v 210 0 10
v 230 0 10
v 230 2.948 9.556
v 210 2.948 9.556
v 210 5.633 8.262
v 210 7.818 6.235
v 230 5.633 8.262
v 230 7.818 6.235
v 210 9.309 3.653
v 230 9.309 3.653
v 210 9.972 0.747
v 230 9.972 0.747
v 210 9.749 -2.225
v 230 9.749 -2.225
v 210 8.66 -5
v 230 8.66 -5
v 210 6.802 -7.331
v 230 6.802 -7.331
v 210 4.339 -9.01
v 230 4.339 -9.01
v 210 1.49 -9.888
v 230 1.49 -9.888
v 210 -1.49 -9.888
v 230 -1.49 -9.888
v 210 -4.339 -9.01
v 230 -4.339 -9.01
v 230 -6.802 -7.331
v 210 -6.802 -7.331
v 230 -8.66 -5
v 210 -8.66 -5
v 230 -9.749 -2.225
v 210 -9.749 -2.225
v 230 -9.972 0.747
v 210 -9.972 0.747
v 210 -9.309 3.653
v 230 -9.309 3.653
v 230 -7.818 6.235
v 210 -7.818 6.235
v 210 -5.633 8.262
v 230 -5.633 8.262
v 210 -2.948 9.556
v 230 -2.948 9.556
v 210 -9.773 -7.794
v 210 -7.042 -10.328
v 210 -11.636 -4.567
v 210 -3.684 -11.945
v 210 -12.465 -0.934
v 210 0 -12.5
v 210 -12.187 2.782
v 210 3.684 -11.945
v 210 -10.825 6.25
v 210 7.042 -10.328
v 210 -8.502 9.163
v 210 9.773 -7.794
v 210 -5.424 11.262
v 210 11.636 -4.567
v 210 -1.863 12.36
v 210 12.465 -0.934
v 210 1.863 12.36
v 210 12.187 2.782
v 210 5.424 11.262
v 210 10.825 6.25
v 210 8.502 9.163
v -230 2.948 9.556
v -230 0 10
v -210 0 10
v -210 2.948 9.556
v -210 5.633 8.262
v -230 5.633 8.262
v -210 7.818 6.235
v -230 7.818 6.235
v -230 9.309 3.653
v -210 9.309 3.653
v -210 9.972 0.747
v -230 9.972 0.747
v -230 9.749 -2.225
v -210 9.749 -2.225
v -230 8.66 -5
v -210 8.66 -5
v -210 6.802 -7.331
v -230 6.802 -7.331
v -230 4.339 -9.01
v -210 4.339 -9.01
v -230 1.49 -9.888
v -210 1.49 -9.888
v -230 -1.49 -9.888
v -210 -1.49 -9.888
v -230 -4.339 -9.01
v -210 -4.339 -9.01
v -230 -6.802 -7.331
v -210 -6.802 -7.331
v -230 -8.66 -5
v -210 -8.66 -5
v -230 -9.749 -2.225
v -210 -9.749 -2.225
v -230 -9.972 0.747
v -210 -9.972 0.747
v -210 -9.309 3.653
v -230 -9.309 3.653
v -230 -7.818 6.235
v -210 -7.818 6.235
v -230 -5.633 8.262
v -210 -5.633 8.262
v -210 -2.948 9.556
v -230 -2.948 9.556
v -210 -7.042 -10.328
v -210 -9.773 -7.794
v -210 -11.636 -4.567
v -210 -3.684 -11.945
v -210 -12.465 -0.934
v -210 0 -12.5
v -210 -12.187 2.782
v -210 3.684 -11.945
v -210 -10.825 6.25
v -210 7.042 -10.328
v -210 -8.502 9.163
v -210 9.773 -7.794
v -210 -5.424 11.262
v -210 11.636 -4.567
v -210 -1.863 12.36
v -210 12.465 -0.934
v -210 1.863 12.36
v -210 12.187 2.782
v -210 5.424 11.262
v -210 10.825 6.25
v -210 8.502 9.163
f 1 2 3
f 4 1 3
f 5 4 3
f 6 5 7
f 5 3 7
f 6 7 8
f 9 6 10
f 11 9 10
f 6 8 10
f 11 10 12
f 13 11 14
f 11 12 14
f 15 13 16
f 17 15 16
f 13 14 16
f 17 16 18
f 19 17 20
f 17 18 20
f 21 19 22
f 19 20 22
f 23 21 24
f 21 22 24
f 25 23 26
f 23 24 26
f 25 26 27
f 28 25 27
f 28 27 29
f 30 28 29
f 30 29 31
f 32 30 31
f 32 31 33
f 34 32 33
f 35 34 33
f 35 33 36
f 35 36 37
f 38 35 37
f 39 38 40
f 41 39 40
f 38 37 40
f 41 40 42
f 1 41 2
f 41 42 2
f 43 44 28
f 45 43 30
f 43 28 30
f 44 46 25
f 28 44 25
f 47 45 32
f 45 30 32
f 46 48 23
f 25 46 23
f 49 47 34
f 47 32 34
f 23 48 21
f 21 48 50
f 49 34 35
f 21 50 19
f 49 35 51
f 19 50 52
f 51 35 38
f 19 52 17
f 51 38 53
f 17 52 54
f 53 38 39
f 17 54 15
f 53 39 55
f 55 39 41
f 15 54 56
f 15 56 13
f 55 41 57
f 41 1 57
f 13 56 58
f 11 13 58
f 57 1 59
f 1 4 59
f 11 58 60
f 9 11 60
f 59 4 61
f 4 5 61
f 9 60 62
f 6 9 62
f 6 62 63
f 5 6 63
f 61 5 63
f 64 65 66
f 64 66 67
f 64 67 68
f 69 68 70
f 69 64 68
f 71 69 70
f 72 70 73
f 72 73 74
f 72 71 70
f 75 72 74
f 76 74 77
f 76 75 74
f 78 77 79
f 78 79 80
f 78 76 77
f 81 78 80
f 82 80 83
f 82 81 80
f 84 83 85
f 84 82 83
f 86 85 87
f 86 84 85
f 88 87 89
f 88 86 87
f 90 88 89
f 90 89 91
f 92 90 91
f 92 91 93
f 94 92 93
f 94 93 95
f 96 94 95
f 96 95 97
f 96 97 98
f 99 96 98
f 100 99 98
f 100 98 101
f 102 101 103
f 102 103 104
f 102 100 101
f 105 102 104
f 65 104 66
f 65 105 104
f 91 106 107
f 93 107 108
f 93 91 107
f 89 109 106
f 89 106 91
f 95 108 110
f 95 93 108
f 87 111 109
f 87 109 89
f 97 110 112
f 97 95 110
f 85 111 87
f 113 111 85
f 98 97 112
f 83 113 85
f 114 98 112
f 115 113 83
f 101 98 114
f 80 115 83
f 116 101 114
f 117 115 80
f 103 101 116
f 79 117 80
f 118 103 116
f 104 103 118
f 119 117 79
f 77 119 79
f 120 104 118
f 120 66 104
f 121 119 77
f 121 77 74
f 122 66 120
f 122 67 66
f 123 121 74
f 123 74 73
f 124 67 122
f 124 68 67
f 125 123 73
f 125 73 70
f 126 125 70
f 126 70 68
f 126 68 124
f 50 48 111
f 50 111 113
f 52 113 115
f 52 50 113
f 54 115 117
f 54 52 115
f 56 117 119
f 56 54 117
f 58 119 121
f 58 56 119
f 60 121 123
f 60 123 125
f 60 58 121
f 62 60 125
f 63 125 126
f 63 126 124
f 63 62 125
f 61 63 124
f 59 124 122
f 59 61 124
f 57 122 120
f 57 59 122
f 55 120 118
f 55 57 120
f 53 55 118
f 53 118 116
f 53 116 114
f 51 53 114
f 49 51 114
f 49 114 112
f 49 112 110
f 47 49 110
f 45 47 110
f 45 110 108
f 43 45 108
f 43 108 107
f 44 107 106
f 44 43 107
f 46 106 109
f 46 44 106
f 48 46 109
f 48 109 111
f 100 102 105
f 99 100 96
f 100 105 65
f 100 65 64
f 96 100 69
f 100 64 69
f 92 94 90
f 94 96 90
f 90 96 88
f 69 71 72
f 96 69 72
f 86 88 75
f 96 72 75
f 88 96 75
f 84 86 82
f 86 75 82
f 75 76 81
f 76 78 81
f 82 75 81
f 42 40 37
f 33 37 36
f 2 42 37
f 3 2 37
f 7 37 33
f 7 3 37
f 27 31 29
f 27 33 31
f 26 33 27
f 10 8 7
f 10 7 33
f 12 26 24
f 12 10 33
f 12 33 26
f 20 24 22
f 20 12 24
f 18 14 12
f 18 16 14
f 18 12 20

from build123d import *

# Parameters (mm, degrees)
SKETCH1_R           = 12.5
BOSS_EXTRUDE1_DEPTH = 230
SKETCH2_R           = 12.5
SKETCH2_R_2         = 10
CUT_EXTRUDE1_DEPTH  = 20


with BuildPart() as part:
    # Sketch1 → Boss-Extrude1 (new body, symmetric)
    with BuildSketch(Plane(origin=(0, 0, 0), x_dir=(0, 0, -1), z_dir=(1, 0, 0))):
        Circle(SKETCH1_R)
    extrude(amount=BOSS_EXTRUDE1_DEPTH, both=True)

    # Sketch2 → Cut-Extrude1 (cut)
    with BuildSketch(Plane.ZY.offset(230)):
        Circle(SKETCH2_R)
        Circle(SKETCH2_R_2, mode=Mode.SUBTRACT)
    cut_extrude1 = extrude(amount=-CUT_EXTRUDE1_DEPTH, mode=Mode.SUBTRACT)

    # Mirror1: Cut-Extrude1 across plane
    add(cut_extrude1.mirror(Plane(origin=(0, 0, 0), x_dir=(0, 0, 1), z_dir=(1, 0, 0))), mode=Mode.SUBTRACT)


solid = part.part
